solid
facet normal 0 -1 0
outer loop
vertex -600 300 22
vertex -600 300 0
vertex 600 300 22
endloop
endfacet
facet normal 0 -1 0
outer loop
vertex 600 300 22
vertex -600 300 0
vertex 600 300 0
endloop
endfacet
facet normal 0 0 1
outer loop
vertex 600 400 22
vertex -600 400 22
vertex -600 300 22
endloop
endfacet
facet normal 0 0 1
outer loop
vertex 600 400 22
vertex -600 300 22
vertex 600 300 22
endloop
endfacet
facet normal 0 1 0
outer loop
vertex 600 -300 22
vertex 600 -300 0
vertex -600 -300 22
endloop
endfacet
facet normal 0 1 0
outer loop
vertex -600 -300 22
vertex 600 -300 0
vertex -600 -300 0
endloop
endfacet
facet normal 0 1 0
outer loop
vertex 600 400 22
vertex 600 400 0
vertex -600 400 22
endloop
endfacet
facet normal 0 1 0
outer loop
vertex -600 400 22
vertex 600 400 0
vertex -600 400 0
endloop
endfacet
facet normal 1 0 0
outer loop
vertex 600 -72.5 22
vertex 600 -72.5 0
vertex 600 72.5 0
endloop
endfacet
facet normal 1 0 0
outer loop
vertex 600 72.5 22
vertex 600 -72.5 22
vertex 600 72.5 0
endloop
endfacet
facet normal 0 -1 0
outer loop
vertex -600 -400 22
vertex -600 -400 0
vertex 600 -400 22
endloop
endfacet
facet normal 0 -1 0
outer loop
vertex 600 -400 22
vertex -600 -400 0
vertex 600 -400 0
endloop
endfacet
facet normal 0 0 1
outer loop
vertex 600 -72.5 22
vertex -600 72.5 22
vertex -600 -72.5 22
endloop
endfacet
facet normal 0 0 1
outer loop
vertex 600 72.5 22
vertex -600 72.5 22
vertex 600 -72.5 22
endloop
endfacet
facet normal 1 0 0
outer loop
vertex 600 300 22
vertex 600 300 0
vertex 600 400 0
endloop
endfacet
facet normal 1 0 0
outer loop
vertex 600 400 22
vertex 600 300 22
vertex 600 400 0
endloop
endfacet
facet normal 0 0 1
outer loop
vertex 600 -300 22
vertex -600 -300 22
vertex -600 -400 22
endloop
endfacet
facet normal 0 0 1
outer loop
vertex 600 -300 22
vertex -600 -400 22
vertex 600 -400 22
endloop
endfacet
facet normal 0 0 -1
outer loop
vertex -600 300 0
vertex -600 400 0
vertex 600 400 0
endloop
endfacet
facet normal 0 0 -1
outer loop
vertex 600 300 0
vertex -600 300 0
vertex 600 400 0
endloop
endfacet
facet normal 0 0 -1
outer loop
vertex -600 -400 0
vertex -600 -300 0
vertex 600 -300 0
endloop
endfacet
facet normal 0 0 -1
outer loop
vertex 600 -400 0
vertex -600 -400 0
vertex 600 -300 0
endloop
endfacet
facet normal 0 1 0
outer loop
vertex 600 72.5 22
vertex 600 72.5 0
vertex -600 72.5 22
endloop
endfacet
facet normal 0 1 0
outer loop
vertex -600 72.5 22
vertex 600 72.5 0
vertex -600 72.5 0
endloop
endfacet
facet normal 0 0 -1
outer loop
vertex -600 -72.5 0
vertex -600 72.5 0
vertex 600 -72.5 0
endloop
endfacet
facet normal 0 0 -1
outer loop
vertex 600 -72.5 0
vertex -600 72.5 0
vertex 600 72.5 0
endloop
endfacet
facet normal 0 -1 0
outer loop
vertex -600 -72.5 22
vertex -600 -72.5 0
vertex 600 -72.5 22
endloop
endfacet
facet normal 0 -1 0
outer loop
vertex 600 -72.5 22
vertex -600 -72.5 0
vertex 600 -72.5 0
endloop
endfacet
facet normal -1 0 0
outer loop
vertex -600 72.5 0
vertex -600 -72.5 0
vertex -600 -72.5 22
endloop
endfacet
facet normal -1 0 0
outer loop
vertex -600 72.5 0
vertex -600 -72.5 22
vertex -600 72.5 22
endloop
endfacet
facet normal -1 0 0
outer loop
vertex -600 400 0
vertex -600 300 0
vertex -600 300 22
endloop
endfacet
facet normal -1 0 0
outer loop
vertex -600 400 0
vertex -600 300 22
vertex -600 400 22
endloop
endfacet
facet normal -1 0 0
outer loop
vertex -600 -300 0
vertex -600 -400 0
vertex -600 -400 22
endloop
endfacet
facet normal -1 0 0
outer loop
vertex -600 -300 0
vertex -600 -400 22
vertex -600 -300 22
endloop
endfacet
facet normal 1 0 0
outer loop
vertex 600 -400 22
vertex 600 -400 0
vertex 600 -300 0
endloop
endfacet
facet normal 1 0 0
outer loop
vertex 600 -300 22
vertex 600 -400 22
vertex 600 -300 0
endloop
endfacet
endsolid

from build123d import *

# Parameters (mm, degrees)
F0_W     = 145
F0_H     = 100
F0_W_2   = 383
F0_W_3   = 382
F1_DEPTH = 22
F0_H_2   = 145
F4_DEPTH = 22


with BuildPart() as f1:
    # F0 (on Top) → F1 (new body)
    with BuildSketch(Plane.XY):
        with Locations((527.5, 350)):
            Rectangle(F0_W, F0_H)
        with Locations((263.5, 350)):
            Rectangle(F0_W_2, F0_H)
        with Locations((-0.5, 350)):
            Rectangle(F0_W, F0_H)
        with Locations((-264, 350)):
            Rectangle(F0_W_3, F0_H)
        with Locations((-527.5, 350)):
            Rectangle(F0_W, F0_H)
    extrude(amount=F1_DEPTH)


with BuildPart() as f1b:
    # F0 (on Top) → F1, piece 2 (new body)
    with BuildSketch(Plane.XY):
        with Locations((-527.5, 210)):
            Rectangle(F0_W, F0_H)
        with Locations((-264, 210)):
            Rectangle(F0_W_3, F0_H)
        with Locations((-0.5, 210)):
            Rectangle(F0_W, F0_H)
        with Locations((263.5, 210)):
            Rectangle(F0_W_2, F0_H)
        with Locations((527.5, 210)):
            Rectangle(F0_W, F0_H)
    extrude(amount=F1_DEPTH)


with BuildPart() as f1c:
    # F0 (on Top) → F1, piece 3 (new body)
    with BuildSketch(Plane.XY):
        with Locations((527.5, 0)):
            Rectangle(F0_W, F0_H_2)
        with Locations((263.5, 0)):
            Rectangle(F0_W_2, F0_H_2)
        with Locations((-0.5, 0)):
            Rectangle(F0_W, F0_H_2)
        with Locations((-264, 0)):
            Rectangle(F0_W_3, F0_H_2)
        with Locations((-527.5, 0)):
            Rectangle(F0_W, F0_H_2)
    extrude(amount=F1_DEPTH)


with BuildPart() as f1d:
    # F0 (on Top) → F1, piece 4 (new body)
    with BuildSketch(Plane.XY):
        with Locations((-527.5, -210)):
            Rectangle(F0_W, F0_H)
        with Locations((-264, -210)):
            Rectangle(F0_W_3, F0_H)
        with Locations((-0.5, -210)):
            Rectangle(F0_W, F0_H)
        with Locations((263.5, -210)):
            Rectangle(F0_W_2, F0_H)
        with Locations((527.5, -210)):
            Rectangle(F0_W, F0_H)
    extrude(amount=F1_DEPTH)


with BuildPart() as f1e:
    # F0 (on Top) → F1, piece 5 (new body)
    with BuildSketch(Plane.XY):
        with Locations((527.5, -350)):
            Rectangle(F0_W, F0_H)
        with Locations((263.5, -350)):
            Rectangle(F0_W_2, F0_H)
        with Locations((-0.5, -350)):
            Rectangle(F0_W, F0_H)
        with Locations((-264, -350)):
            Rectangle(F0_W_3, F0_H)
        with Locations((-527.5, -350)):
            Rectangle(F0_W, F0_H)
    extrude(amount=F1_DEPTH)


with BuildPart() as f4:
    # F0 (on Top) → F4 (new body)
    with BuildSketch(Plane.XY):
        with Locations((527.5, 350)):
            Rectangle(F0_W, F0_H)
        with Locations((263.5, 350)):
            Rectangle(F0_W_2, F0_H)
        with Locations((-0.5, 350)):
            Rectangle(F0_W, F0_H)
        with Locations((-264, 350)):
            Rectangle(F0_W_3, F0_H)
        with Locations((-527.5, 350)):
            Rectangle(F0_W, F0_H)
    extrude(amount=F4_DEPTH)


with BuildPart() as f4b:
    # F0 (on Top) → F4, piece 2 (new body)
    with BuildSketch(Plane.XY):
        with Locations((-527.5, -350)):
            Rectangle(F0_W, F0_H)
        with Locations((-264, -350)):
            Rectangle(F0_W_3, F0_H)
        with Locations((-0.5, -350)):
            Rectangle(F0_W, F0_H)
        with Locations((263.5, -350)):
            Rectangle(F0_W_2, F0_H)
        with Locations((527.5, -350)):
            Rectangle(F0_W, F0_H)
    extrude(amount=F4_DEPTH)


solid = Compound([f1c.part, f4.part, f4b.part])
